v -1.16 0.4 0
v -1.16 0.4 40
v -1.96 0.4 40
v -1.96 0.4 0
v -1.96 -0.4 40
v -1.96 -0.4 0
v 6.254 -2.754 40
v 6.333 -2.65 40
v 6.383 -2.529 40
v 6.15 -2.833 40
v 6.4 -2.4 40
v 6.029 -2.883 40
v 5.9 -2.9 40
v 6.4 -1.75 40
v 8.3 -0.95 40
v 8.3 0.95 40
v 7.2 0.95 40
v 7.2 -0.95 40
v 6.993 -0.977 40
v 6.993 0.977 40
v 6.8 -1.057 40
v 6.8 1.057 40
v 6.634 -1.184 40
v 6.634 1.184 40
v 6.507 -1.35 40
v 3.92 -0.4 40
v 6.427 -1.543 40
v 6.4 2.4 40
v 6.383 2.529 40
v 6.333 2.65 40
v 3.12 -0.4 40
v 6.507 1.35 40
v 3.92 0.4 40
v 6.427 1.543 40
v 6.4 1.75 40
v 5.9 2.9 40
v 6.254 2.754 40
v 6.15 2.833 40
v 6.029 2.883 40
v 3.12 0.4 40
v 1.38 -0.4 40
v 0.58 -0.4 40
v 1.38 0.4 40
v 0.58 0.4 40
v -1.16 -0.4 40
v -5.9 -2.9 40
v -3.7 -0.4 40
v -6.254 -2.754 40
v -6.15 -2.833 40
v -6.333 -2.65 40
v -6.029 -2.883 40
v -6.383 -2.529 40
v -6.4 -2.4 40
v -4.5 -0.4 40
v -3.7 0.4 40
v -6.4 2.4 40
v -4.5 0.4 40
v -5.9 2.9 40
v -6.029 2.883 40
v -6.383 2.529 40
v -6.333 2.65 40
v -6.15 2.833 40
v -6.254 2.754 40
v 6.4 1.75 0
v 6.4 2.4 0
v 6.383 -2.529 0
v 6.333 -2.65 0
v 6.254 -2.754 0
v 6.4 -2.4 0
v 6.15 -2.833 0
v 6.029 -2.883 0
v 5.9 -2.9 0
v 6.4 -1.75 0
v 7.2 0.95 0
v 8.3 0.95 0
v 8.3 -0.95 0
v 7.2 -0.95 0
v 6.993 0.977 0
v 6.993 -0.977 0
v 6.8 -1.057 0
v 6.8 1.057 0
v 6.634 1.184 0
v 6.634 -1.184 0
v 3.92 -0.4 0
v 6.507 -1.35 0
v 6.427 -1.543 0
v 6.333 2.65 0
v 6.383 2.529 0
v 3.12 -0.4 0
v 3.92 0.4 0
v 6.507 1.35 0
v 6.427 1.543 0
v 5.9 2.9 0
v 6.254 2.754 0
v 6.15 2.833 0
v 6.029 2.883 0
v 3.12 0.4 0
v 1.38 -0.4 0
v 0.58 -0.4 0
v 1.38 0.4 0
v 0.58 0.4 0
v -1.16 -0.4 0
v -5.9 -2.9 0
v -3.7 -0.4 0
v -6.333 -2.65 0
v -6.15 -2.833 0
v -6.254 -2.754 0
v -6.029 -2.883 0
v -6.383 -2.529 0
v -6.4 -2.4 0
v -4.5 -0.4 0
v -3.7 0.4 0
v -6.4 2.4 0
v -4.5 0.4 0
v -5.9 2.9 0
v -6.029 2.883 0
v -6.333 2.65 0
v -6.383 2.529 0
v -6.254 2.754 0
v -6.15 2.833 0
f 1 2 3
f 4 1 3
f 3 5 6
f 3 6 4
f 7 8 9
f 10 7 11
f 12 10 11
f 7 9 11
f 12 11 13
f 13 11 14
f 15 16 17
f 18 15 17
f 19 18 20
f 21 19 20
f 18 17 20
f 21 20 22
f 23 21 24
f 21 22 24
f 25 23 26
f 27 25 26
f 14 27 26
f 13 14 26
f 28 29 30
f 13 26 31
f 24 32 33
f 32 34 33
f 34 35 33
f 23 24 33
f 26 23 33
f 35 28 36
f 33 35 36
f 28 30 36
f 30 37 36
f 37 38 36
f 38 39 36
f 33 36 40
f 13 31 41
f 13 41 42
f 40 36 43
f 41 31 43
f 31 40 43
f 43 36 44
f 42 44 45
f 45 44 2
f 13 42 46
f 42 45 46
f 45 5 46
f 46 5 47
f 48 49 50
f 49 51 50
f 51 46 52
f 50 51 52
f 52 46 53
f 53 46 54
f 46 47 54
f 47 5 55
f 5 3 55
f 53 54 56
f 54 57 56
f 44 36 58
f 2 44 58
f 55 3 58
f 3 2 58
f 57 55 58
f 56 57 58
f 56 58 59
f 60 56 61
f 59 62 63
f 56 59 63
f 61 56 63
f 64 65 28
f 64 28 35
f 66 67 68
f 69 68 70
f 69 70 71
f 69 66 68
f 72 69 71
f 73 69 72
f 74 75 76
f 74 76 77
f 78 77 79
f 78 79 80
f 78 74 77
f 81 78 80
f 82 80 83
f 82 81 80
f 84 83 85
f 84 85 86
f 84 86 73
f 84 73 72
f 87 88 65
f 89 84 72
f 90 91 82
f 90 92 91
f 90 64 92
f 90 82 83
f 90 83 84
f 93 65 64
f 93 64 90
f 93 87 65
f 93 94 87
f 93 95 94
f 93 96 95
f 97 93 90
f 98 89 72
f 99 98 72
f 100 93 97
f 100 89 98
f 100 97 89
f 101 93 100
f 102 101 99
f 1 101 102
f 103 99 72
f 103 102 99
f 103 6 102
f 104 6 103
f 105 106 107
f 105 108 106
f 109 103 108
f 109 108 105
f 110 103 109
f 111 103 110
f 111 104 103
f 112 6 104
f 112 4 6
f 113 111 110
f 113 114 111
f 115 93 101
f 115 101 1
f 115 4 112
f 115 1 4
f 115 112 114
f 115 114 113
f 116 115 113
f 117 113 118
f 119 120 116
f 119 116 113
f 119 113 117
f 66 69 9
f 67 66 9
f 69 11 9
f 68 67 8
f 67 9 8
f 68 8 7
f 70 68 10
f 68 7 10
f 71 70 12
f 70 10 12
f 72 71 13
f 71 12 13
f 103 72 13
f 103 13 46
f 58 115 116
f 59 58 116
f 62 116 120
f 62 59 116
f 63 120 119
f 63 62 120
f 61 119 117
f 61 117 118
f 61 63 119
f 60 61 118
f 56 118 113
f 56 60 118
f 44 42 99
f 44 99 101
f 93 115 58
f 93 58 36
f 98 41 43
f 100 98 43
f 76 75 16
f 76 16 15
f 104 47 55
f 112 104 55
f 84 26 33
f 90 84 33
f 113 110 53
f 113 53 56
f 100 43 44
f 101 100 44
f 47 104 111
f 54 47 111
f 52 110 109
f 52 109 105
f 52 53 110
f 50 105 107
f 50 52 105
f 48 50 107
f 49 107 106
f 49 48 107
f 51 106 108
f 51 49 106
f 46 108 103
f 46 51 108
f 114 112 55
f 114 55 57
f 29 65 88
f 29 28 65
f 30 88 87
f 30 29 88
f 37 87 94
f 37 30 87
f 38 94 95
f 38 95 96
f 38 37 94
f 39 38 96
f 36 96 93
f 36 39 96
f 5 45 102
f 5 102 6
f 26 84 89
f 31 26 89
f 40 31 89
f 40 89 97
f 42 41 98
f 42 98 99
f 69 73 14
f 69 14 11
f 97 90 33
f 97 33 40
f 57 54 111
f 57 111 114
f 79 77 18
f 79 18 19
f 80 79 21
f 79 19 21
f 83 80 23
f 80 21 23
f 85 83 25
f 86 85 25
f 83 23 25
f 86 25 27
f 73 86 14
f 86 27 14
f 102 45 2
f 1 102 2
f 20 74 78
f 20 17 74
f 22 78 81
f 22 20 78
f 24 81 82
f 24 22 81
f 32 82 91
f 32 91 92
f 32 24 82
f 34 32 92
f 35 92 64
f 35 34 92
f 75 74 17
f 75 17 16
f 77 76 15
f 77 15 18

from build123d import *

# Parameters (mm, degrees)
BOSS_EXTRU_1_DEPTH         = 40
ESQUISSE3_W                = 0.8
ESQUISSE3_H                = 0.8
ENL_V_MAT_EXTRU_1_DEPTH    = 41.954853192
R_P_TITION_LIN_AIRE1_COUNT = 4
R_P_TITION_LIN_AIRE1_PITCH = 2.54
CONG_1_R                   = 0.8
CONG_2_R                   = 0.5


with BuildPart() as part:
    # Esquisse1 → Boss.-Extru.1 (new body)
    with BuildSketch(Plane.XY):
        Polygon((6.4, 0.95), (8.3, 0.95), (8.3, -0.95), (6.4, -0.95), (6.4, -2.9), (-6.4, -2.9), (-6.4, 2.9), (6.4, 2.9), align=None)
    extrude(amount=BOSS_EXTRU_1_DEPTH)

    # Esquisse3 → Enlèv. mat.-Extru.1 (cut, through all)
    with BuildSketch(Plane(origin=(0, 0, 0), x_dir=(-1, 0, 0), z_dir=(0, 0, -1))):
        with Locations((4.1, 0)):
            Rectangle(ESQUISSE3_W, ESQUISSE3_H)
    enl_v_mat_extru_1 = extrude(amount=-ENL_V_MAT_EXTRU_1_DEPTH, mode=Mode.SUBTRACT)

    # Répétition linéaire1: Enlèv. mat.-Extru.1 ×4
    with Locations(*[(i * R_P_TITION_LIN_AIRE1_PITCH, 0, 0) for i in range(1, R_P_TITION_LIN_AIRE1_COUNT)]):
        add(enl_v_mat_extru_1, mode=Mode.SUBTRACT)

    # Congé1
    cong_1_edges = [part.edges().sort_by_distance(p)[0] for p in [
        (6.4, 0.95, 20),
        (6.4, -0.95, 20),
    ]]
    fillet(cong_1_edges, radius=CONG_1_R)

    # Congé2
    cong_2_edges = [part.edges().sort_by_distance(p)[0] for p in [
        (6.4, -2.9, 20),
        (-6.4, -2.9, 20),
        (-6.4, 2.9, 20),
        (6.4, 2.9, 20),
    ]]
    fillet(cong_2_edges, radius=CONG_2_R)


solid = part.part
